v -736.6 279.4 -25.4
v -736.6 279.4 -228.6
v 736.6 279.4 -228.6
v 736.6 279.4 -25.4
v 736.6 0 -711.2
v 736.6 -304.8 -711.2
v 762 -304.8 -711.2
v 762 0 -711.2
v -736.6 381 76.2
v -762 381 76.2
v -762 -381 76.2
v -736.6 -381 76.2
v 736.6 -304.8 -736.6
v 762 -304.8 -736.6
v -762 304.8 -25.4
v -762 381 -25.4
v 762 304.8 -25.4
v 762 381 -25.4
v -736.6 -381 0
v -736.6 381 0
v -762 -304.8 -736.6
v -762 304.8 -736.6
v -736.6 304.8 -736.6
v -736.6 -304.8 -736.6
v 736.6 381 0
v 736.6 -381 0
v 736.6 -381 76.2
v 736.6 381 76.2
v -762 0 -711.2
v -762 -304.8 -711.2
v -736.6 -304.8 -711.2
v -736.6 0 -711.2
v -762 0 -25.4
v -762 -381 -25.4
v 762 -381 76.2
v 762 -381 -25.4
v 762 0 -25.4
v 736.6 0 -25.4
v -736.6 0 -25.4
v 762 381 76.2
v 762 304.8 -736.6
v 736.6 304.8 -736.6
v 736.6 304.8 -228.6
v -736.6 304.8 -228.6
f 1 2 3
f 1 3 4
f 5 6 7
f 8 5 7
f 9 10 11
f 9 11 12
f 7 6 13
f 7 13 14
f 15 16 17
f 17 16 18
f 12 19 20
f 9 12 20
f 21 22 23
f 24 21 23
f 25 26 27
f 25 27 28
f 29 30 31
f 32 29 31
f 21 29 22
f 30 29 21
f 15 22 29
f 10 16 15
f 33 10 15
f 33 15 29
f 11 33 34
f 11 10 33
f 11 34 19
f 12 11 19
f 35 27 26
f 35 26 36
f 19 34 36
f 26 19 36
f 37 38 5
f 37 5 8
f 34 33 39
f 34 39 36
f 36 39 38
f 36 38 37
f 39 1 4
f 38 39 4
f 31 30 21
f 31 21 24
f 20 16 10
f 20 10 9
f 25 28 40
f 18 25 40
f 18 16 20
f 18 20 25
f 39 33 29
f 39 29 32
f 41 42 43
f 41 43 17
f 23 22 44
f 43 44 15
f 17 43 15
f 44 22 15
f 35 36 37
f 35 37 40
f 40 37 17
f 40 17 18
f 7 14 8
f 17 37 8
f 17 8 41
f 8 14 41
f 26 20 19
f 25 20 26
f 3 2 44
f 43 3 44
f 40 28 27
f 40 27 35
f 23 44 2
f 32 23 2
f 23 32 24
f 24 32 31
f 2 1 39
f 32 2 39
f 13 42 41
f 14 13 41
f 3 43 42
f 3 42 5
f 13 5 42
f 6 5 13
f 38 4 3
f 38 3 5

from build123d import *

# Parameters (mm, degrees)
F0_W      = 1524
F0_H      = 762
F1_DEPTH  = 25.4
F2_W      = 25.4
F2_H      = 304.8
F3_DEPTH  = 685.8
F5_W      = 25.4
F5_H      = 609.6
F4_W      = 25.4
F4_H      = 609.6
F6_DEPTH  = 25.4
F7_W      = 25.4
F7_H      = 203.2
F8_DEPTH  = 1473.2
F9_W      = 25.4
F9_H      = 762
F10_DEPTH = 76.2


with BuildPart() as f1:
    # F0 (on Top) → F1 (new body)
    with BuildSketch(Plane.XY):
        Rectangle(F0_W, F0_H)
    extrude(amount=-F1_DEPTH)

    # F2 (on face) → F3 (join)
    with BuildSketch(Plane(origin=(0, 0, -25.4), x_dir=(1, 0, 0), z_dir=(0, 0, -1))):
        with Locations((749.3, -152.4)):
            Rectangle(F2_W, F2_H)
        with Locations((-749.3, -152.4)):
            Rectangle(F2_W, F2_H)
    extrude(amount=F3_DEPTH)

    # F5 (on face) + F4 (on face) → F6 (join)
    with BuildSketch(Plane(origin=(0, 0, -711.2), x_dir=(1, 0, 0), z_dir=(0, 0, -1))):
        with Locations((-749.3, 0)):
            Rectangle(F5_W, F5_H)
    with BuildSketch(Plane(origin=(0, 0, -711.2), x_dir=(1, 0, 0), z_dir=(0, 0, -1))):
        with Locations((749.3, 0)):
            Rectangle(F4_W, F4_H)
    extrude(amount=F6_DEPTH)

    # F7 (on face) → F8 (join, through all)
    with BuildSketch(Plane.YZ.offset(-736.6)):
        with Locations((292.1, -127)):
            Rectangle(F7_W, F7_H)
    extrude(amount=F8_DEPTH)

    # F9 (on face) → F10 (join)
    with BuildSketch(Plane.XY):
        with Locations((749.3, 0)):
            Rectangle(F9_W, F9_H)
        with Locations((-749.3, 0)):
            Rectangle(F9_W, F9_H)
    extrude(amount=F10_DEPTH)


solid = f1.part
